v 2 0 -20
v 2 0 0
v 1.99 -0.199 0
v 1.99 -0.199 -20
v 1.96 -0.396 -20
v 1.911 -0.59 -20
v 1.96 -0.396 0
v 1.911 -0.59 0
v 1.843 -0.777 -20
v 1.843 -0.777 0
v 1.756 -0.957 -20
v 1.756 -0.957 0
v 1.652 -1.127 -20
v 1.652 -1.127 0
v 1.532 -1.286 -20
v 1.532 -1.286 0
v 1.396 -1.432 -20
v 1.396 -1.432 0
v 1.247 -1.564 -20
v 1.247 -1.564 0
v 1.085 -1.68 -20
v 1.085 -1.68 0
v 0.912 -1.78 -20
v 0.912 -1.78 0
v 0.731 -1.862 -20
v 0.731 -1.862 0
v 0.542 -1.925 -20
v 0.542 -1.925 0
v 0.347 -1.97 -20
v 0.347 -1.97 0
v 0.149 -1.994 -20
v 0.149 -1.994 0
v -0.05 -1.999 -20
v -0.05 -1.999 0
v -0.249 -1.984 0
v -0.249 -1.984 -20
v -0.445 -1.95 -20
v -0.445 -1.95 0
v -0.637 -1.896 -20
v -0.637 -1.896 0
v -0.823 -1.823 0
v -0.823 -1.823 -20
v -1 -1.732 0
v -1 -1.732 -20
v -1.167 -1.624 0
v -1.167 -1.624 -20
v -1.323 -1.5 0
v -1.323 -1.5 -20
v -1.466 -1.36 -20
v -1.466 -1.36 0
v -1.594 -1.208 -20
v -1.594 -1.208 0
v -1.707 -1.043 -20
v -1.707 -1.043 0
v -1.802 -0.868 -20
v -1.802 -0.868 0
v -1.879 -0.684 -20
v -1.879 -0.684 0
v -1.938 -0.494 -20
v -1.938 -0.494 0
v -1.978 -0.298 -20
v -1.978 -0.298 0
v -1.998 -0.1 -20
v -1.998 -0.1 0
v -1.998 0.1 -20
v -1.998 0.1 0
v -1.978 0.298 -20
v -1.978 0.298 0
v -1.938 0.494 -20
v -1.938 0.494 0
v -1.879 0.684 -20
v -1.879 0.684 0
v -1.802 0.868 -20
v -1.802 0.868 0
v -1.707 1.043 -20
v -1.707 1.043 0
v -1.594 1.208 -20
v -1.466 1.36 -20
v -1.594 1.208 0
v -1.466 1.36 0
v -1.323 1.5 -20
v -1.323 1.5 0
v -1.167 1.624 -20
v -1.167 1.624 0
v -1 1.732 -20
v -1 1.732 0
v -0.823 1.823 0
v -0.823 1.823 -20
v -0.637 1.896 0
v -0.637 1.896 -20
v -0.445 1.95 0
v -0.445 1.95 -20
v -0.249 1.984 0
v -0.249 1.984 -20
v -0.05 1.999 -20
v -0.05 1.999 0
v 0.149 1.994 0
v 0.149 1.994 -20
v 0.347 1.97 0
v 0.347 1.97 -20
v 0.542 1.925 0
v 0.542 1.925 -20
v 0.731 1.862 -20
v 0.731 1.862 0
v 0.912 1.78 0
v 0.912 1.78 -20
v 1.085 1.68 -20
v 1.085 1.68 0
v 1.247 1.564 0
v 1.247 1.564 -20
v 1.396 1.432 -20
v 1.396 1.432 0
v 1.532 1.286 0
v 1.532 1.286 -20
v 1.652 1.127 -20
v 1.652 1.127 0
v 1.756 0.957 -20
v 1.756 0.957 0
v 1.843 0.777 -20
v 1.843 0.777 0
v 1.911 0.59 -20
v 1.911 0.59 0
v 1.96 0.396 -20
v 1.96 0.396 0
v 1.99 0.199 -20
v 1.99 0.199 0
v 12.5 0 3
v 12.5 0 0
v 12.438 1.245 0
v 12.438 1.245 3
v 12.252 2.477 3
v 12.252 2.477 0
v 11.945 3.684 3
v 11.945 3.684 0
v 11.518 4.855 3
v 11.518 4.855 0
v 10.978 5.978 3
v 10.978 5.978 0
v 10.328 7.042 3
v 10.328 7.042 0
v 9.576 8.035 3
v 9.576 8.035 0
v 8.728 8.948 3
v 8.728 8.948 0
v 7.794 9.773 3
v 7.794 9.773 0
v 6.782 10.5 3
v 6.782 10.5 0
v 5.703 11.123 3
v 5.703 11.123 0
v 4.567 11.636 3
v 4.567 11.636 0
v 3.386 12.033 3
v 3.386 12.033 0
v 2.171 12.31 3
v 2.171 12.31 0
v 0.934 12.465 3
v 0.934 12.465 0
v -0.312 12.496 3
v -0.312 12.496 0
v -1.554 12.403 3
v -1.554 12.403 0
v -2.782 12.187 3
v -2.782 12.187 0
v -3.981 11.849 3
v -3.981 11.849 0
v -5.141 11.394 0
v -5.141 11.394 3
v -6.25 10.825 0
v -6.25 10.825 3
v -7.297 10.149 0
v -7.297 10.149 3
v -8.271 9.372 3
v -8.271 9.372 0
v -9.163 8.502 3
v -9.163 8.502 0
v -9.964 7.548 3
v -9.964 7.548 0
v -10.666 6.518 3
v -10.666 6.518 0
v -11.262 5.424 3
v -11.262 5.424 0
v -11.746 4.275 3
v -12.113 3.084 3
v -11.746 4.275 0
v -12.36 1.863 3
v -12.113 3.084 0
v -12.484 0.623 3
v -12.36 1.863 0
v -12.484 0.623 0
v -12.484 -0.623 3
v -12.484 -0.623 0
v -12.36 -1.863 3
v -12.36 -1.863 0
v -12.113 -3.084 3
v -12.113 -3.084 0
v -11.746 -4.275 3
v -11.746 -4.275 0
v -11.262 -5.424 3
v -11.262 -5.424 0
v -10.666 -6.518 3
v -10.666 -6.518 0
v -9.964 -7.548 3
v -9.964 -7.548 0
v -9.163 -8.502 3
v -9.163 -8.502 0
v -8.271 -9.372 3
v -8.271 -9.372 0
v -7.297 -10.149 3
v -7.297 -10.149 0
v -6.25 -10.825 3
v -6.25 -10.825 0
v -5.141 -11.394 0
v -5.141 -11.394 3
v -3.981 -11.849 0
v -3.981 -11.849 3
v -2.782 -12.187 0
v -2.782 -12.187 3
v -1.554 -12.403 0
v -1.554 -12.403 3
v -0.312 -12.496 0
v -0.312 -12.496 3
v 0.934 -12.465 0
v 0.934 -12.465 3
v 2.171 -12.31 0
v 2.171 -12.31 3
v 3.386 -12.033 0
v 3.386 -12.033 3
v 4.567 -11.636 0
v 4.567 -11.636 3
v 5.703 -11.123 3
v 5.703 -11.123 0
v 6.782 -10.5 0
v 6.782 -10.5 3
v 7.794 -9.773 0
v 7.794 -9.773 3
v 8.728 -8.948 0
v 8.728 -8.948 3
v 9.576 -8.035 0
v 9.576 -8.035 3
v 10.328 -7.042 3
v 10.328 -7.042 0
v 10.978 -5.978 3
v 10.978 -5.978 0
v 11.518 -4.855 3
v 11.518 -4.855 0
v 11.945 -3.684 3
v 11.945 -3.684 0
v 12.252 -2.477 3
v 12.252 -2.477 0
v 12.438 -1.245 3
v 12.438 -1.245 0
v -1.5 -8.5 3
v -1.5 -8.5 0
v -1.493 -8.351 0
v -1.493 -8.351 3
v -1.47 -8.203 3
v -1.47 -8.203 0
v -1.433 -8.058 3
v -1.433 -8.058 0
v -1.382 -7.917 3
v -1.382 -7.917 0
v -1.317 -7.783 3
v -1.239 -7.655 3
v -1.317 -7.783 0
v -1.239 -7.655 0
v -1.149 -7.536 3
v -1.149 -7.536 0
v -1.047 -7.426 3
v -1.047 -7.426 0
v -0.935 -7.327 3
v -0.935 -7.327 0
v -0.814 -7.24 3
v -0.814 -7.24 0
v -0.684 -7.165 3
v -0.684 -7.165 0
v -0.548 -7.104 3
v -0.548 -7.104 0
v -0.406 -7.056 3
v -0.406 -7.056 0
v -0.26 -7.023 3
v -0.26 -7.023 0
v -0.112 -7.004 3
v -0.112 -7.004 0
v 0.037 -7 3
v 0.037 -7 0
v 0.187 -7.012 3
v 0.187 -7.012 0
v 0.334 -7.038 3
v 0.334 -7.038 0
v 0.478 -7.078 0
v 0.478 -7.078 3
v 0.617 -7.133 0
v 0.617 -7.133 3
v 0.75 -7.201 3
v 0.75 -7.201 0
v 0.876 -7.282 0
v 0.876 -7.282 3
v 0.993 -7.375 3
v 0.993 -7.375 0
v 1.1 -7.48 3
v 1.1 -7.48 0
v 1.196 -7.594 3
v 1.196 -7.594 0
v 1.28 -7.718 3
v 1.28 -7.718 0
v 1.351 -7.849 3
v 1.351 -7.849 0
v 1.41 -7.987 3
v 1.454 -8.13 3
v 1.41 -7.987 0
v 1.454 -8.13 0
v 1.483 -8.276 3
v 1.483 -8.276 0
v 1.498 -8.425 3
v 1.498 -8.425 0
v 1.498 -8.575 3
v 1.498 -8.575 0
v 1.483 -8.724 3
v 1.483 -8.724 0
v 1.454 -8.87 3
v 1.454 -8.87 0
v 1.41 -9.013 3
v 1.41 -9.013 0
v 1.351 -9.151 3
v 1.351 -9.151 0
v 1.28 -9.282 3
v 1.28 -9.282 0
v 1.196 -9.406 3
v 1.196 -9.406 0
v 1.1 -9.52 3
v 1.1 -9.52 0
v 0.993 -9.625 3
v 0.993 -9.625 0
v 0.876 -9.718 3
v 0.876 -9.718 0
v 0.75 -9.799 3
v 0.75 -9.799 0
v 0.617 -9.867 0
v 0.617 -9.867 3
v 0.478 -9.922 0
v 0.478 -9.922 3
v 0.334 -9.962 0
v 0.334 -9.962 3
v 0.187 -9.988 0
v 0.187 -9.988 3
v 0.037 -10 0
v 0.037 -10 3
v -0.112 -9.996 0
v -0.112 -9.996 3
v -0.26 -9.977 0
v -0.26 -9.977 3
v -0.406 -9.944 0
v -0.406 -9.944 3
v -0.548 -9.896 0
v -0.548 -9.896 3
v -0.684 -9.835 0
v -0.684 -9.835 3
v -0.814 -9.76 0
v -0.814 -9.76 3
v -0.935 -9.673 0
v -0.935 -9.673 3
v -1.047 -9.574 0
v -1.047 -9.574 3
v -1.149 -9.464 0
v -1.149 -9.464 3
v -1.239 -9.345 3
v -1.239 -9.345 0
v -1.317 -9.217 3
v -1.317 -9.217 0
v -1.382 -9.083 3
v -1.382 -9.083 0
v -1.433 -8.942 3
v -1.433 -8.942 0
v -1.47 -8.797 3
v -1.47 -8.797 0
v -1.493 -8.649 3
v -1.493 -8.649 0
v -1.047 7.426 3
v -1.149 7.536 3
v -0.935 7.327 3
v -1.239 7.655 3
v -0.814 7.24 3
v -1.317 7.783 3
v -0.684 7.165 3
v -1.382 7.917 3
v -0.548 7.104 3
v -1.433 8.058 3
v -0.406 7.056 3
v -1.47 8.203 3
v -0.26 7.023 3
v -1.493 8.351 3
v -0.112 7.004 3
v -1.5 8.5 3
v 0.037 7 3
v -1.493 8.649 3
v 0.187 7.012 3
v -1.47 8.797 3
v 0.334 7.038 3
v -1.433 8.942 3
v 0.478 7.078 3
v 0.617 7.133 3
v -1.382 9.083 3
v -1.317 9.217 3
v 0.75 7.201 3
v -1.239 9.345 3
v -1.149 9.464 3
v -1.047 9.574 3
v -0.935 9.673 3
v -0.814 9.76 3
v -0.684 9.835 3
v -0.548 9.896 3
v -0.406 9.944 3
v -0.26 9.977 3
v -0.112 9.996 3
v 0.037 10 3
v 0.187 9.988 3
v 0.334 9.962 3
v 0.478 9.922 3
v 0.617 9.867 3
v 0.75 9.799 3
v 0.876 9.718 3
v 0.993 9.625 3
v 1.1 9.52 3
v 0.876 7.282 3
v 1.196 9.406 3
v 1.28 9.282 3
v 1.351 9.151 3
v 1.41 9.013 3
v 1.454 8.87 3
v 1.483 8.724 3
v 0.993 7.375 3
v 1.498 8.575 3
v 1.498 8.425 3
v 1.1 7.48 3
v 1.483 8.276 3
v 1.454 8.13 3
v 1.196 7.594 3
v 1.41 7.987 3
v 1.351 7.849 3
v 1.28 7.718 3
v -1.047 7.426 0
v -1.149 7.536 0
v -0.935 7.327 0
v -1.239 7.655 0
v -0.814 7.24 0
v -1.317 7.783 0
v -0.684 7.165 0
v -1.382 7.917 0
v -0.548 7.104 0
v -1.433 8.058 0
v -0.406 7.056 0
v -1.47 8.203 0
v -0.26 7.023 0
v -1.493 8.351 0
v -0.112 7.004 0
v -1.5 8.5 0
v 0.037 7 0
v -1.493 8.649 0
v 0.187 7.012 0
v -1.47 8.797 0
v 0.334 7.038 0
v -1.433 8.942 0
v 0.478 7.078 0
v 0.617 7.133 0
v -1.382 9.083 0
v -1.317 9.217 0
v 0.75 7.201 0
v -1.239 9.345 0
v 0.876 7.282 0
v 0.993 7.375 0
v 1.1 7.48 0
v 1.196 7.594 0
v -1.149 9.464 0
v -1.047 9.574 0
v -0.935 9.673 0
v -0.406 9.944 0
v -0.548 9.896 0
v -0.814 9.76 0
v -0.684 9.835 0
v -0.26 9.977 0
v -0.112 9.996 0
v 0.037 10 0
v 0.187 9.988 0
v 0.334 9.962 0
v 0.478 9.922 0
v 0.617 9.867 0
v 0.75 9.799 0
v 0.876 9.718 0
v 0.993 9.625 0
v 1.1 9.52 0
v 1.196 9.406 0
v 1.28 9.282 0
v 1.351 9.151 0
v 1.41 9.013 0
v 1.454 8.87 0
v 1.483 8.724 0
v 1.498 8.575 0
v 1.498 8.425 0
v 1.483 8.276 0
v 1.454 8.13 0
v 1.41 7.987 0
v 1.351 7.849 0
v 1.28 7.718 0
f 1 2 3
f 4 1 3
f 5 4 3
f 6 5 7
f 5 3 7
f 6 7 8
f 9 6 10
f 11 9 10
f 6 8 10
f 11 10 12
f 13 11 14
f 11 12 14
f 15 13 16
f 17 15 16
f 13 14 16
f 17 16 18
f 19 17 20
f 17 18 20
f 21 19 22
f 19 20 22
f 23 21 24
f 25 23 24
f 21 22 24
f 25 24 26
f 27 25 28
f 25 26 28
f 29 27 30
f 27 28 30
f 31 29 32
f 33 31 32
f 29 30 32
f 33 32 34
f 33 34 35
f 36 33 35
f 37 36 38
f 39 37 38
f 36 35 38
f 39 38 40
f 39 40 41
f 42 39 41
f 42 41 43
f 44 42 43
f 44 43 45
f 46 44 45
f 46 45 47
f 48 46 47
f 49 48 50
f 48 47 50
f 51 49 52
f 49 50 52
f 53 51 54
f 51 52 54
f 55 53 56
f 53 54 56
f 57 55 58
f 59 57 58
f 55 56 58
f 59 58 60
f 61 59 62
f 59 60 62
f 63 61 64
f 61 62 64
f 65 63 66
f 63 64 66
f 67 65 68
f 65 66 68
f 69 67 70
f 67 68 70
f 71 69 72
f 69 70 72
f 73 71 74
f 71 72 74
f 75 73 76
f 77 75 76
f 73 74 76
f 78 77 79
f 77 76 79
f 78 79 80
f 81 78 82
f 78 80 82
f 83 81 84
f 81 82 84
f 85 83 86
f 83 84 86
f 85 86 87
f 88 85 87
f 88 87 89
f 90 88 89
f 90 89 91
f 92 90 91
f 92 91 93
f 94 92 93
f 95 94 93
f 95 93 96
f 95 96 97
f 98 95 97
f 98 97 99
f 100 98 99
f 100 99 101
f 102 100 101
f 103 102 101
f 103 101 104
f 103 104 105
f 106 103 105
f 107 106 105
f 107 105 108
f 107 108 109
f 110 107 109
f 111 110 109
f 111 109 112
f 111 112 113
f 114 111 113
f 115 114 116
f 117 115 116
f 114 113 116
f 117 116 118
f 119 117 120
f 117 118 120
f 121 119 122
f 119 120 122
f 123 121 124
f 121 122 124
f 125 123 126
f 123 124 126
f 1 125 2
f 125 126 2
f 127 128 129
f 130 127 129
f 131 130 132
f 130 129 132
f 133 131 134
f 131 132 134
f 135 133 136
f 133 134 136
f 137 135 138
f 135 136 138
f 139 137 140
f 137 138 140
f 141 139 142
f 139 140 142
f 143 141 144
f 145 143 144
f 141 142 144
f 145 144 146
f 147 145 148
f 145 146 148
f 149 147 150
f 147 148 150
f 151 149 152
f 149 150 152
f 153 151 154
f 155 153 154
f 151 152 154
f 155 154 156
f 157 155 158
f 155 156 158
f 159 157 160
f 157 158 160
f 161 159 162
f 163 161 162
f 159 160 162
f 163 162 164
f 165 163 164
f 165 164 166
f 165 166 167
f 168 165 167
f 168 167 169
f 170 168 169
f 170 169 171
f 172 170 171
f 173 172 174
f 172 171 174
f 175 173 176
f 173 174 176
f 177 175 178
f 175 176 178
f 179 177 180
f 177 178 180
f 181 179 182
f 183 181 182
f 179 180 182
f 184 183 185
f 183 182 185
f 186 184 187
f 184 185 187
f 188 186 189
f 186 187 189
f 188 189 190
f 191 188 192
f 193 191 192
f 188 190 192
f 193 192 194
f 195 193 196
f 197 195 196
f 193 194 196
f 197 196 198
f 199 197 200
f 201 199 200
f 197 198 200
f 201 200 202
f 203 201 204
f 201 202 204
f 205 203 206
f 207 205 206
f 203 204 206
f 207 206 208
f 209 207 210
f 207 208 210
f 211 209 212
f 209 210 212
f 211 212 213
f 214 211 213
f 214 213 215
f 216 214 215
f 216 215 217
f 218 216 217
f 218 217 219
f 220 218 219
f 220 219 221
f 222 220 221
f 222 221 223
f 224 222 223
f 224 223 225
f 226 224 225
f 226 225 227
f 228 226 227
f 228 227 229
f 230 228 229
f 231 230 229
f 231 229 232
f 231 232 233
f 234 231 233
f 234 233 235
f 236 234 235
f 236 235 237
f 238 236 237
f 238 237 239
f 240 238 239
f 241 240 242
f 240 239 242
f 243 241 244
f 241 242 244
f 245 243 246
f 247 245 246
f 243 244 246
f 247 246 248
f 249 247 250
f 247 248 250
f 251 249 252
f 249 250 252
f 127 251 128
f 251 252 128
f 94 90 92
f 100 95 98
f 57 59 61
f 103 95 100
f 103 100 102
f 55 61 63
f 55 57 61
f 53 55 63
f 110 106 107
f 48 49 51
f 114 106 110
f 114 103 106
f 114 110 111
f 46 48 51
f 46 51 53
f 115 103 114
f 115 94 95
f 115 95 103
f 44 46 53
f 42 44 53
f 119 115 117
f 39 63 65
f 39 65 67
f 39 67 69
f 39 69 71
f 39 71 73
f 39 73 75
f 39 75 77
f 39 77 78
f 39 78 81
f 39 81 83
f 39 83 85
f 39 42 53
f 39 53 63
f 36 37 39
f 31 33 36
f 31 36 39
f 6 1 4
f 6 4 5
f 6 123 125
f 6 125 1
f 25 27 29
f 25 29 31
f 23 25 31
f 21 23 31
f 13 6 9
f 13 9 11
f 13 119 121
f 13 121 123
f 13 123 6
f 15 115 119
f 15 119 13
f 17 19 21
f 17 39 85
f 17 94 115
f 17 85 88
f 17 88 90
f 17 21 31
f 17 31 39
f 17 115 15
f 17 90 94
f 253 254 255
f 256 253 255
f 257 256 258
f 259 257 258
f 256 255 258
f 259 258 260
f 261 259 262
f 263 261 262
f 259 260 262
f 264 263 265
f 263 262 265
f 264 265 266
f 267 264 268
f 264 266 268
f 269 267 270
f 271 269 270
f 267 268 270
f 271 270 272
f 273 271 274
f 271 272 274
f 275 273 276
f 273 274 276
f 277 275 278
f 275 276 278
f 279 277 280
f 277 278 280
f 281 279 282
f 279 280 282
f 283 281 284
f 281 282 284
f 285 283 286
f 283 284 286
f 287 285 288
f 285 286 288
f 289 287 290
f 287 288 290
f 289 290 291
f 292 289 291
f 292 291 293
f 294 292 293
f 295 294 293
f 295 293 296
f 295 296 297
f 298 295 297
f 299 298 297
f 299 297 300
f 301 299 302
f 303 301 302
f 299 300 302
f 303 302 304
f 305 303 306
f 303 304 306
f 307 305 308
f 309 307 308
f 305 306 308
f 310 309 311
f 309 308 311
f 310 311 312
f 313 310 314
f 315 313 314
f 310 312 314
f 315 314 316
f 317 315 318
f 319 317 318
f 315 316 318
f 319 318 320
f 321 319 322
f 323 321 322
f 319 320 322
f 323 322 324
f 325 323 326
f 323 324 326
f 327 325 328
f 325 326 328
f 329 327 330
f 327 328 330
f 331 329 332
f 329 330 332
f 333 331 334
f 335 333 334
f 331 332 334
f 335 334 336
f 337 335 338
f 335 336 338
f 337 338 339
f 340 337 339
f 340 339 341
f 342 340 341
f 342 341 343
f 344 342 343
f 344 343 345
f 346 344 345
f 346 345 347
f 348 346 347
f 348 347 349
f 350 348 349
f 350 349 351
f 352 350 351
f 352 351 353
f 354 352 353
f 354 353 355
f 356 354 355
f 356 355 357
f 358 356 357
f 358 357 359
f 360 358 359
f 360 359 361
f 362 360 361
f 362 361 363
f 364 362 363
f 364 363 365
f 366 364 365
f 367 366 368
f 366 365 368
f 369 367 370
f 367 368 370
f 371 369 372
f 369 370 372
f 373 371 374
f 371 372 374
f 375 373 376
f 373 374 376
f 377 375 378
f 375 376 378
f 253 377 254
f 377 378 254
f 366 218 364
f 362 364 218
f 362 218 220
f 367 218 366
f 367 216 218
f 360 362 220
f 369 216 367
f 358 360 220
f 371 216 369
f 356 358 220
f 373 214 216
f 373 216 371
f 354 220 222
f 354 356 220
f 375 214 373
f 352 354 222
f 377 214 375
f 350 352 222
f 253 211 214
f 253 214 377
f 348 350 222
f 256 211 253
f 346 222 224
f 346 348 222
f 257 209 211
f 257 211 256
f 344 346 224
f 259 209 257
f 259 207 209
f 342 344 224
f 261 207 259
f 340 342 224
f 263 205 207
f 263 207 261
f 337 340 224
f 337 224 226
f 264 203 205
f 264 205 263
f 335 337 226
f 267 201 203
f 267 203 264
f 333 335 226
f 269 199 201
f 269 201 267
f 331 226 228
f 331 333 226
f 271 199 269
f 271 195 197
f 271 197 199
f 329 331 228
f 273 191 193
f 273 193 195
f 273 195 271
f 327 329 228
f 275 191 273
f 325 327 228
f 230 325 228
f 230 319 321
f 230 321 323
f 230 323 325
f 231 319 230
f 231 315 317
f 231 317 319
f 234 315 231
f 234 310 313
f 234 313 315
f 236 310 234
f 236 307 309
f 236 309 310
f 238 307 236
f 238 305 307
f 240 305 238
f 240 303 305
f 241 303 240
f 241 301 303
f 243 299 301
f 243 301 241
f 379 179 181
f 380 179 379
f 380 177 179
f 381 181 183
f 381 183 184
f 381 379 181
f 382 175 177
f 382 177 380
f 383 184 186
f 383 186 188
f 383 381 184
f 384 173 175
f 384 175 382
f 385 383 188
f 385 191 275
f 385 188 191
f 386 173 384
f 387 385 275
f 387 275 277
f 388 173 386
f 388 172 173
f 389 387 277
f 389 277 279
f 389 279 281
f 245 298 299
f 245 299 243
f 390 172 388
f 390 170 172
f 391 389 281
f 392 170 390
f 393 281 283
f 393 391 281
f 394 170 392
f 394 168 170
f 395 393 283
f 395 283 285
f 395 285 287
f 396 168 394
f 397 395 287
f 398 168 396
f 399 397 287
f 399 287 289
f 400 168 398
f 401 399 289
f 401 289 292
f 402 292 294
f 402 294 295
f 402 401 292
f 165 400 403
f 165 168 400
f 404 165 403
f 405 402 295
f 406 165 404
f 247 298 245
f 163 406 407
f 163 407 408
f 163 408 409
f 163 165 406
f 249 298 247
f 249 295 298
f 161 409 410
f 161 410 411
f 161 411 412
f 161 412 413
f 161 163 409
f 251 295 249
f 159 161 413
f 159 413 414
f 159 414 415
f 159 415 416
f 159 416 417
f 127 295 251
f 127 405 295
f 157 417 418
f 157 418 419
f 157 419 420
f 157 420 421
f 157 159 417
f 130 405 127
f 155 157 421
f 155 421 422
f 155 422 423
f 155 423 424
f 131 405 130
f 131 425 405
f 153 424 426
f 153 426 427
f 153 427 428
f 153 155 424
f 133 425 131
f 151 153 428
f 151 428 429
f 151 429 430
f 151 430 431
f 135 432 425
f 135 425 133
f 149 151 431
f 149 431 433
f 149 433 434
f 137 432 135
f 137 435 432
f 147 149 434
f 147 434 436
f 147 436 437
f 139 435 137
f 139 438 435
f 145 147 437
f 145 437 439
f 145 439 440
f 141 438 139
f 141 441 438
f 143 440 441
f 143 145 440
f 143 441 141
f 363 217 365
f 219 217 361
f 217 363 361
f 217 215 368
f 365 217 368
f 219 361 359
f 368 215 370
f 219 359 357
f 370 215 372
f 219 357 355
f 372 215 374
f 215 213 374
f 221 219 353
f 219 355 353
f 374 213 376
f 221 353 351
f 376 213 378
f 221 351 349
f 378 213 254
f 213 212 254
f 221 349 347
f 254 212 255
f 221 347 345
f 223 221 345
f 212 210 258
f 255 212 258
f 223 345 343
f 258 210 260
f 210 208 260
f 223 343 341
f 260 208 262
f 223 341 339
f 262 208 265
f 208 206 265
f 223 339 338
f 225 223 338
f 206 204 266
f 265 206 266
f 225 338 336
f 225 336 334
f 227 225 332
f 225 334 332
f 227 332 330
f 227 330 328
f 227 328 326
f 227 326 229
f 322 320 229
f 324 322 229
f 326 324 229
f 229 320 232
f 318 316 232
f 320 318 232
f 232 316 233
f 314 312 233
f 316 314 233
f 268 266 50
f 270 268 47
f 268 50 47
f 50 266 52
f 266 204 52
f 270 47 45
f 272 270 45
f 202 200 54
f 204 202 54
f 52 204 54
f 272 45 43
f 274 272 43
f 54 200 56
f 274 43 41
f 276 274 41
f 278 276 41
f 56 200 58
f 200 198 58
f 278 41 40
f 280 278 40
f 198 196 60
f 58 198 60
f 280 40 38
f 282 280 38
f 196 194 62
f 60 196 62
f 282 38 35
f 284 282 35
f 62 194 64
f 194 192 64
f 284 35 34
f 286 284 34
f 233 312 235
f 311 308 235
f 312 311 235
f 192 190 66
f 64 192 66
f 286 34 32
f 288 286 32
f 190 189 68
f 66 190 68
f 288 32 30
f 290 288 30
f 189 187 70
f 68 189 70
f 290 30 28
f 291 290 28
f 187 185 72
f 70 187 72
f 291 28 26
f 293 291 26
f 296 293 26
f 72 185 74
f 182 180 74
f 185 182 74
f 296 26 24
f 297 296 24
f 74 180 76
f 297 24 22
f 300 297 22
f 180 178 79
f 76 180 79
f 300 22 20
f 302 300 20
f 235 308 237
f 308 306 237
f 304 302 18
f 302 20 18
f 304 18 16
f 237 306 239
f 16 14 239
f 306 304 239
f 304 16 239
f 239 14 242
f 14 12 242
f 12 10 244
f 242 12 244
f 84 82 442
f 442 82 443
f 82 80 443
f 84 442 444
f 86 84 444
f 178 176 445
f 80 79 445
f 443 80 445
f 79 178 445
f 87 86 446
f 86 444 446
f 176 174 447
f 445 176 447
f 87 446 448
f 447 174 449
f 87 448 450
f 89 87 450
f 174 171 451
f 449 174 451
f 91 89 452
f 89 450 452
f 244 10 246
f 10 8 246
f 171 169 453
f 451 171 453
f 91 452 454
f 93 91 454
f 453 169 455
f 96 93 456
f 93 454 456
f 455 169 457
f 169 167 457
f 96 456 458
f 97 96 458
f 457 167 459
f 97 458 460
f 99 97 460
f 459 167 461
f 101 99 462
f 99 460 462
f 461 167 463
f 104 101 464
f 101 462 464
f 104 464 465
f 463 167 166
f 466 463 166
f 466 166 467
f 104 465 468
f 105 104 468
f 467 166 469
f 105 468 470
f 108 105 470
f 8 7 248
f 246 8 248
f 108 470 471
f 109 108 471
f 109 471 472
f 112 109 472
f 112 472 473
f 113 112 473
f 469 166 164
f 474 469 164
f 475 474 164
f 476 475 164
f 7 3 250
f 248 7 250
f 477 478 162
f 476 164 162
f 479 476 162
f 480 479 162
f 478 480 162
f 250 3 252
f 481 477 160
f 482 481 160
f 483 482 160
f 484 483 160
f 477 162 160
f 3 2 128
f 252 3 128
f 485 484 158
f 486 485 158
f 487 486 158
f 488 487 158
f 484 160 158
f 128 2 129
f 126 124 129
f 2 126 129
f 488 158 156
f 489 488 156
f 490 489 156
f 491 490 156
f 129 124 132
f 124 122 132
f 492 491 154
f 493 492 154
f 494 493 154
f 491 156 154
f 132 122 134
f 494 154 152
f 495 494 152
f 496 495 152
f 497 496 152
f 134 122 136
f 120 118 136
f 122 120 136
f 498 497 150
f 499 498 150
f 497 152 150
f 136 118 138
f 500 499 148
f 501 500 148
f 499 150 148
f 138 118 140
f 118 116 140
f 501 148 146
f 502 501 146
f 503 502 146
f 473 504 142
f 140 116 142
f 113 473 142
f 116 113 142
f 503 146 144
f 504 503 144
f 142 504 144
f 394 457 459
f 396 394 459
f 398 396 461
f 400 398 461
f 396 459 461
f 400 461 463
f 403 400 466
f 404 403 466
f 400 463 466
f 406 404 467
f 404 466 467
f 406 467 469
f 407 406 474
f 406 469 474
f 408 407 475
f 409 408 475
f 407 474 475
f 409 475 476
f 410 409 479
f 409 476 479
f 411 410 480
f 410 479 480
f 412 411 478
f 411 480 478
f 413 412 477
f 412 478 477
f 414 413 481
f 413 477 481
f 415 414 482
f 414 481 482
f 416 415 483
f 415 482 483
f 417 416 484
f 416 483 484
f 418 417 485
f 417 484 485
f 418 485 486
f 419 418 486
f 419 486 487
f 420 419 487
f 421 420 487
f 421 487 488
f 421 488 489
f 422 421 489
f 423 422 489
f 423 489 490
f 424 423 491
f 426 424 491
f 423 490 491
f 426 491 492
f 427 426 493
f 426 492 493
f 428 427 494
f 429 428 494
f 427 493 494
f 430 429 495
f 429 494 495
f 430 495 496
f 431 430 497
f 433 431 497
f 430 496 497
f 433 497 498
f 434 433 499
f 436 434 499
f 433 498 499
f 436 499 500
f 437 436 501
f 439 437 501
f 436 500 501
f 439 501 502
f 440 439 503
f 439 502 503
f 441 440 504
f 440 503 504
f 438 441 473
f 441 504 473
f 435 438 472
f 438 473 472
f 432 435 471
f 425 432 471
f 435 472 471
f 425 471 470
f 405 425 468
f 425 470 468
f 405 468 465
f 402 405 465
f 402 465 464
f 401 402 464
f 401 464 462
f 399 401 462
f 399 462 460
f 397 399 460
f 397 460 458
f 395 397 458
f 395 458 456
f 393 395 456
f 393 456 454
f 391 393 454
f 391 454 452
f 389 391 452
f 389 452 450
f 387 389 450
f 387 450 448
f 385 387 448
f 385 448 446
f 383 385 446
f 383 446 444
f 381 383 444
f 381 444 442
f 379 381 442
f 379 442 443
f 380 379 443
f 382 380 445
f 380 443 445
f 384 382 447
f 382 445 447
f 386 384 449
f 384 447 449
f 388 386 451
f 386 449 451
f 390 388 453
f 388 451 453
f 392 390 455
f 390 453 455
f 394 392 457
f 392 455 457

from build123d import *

# Parameters (mm, degrees)
SKETCH_1_R          = 12.5
EXTRUDE_1_DEPTH     = 3
SKETCH_2_R          = 1.5
CUT_EXTRUDE_1_DEPTH = 3
SKETCH_3_R          = 2
EXTRUDE_2_DEPTH     = 20


with BuildPart() as part:
    # 草图1 → 凸台-拉伸1 (new body)
    with BuildSketch(Plane.XY):
        Circle(SKETCH_1_R)
    extrude(amount=EXTRUDE_1_DEPTH)

    # 草图2 → 切除-拉伸1 (cut)
    with BuildSketch(Plane(origin=(0, 0, 0), x_dir=(-1, 0, 0), z_dir=(0, 0, -1))):
        with Locations((0, 8.5)):
            Circle(SKETCH_2_R)
        with Locations((0, -8.5)):
            Circle(SKETCH_2_R)
    extrude(amount=-CUT_EXTRUDE_1_DEPTH, mode=Mode.SUBTRACT)

    # 草图3 → 凸台-拉伸2 (add)
    with BuildSketch(Plane(origin=(0, 0, 0), x_dir=(-1, 0, 0), z_dir=(0, 0, -1))):
        with Locations(Location((0, 0, 0), (0, 0, 180))):
            Circle(SKETCH_3_R)
    extrude(amount=EXTRUDE_2_DEPTH)


solid = part.part
